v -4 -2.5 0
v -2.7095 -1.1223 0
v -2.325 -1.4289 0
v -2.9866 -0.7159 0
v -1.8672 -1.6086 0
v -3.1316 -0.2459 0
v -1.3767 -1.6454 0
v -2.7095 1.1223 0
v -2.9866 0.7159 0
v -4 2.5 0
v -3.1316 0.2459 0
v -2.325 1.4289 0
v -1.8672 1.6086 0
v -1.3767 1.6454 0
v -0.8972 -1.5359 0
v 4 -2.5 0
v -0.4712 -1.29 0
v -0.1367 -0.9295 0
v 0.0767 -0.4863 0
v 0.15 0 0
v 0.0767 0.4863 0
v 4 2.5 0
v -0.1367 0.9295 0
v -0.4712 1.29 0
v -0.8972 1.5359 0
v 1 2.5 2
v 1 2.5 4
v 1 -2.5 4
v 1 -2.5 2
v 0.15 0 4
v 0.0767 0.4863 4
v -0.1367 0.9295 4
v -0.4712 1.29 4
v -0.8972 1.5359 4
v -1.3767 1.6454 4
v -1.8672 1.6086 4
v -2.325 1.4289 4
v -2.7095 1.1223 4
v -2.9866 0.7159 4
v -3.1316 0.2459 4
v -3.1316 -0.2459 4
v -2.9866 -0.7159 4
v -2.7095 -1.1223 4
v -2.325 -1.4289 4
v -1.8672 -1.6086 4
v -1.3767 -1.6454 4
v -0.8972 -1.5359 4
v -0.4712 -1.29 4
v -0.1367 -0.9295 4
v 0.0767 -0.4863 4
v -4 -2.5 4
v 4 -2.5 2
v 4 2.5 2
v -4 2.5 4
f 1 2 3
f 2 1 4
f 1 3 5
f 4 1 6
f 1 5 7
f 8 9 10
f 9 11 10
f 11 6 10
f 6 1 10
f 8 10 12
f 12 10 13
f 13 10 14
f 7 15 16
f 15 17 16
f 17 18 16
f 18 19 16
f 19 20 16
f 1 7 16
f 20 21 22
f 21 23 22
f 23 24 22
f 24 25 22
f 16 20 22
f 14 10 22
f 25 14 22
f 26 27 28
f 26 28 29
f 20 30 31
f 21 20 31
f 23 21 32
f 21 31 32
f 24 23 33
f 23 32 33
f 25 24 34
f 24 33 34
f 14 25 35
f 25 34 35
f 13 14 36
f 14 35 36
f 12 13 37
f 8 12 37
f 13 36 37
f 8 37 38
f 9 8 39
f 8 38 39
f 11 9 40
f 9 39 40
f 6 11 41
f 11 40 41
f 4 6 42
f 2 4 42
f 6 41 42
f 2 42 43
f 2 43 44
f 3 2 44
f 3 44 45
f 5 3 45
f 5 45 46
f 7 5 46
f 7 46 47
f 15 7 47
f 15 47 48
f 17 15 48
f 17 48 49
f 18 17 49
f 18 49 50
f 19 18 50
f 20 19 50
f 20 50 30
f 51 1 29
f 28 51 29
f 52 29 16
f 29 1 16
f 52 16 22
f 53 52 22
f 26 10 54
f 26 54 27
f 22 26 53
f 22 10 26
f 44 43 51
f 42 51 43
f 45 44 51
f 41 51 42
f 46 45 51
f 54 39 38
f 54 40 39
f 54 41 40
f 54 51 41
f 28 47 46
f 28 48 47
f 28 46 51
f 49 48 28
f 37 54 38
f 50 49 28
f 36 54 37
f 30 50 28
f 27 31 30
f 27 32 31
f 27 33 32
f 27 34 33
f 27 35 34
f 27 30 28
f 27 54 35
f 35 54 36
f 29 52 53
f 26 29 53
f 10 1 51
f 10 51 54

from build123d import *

# Parameters (mm, degrees)
SKETCH_1_W          = 8
SKETCH_1_H          = 5
EXTRUDE_1_DEPTH     = 4
SKETCH_2_W          = 2
SKETCH_2_H          = 5
CUT_EXTRUDE_1_DEPTH = 3
SKETCH_3_R          = 1.65
CUT_EXTRUDE_2_DEPTH = 5


with BuildPart() as part:
    # Эскиз1 → Бобышка-Вытянуть1 (new body)
    with BuildSketch(Plane.XY):
        Rectangle(SKETCH_1_W, SKETCH_1_H)
    extrude(amount=EXTRUDE_1_DEPTH)

    # Эскиз2 → Вырез-Вытянуть1 (cut)
    with BuildSketch(Plane(origin=(4, 0, 0), x_dir=(0, 0, -1), z_dir=(1, 0, 0))):
        with Locations((-3, 0)):
            Rectangle(SKETCH_2_W, SKETCH_2_H)
    extrude(amount=-CUT_EXTRUDE_1_DEPTH, mode=Mode.SUBTRACT)

    # Эскиз3 → Вырез-Вытянуть2 (cut)
    with BuildSketch(Plane.XY.offset(4)):
        with Locations((-1.5, 0)):
            Circle(SKETCH_3_R)
    extrude(amount=-CUT_EXTRUDE_2_DEPTH, mode=Mode.SUBTRACT)


solid = part.part
